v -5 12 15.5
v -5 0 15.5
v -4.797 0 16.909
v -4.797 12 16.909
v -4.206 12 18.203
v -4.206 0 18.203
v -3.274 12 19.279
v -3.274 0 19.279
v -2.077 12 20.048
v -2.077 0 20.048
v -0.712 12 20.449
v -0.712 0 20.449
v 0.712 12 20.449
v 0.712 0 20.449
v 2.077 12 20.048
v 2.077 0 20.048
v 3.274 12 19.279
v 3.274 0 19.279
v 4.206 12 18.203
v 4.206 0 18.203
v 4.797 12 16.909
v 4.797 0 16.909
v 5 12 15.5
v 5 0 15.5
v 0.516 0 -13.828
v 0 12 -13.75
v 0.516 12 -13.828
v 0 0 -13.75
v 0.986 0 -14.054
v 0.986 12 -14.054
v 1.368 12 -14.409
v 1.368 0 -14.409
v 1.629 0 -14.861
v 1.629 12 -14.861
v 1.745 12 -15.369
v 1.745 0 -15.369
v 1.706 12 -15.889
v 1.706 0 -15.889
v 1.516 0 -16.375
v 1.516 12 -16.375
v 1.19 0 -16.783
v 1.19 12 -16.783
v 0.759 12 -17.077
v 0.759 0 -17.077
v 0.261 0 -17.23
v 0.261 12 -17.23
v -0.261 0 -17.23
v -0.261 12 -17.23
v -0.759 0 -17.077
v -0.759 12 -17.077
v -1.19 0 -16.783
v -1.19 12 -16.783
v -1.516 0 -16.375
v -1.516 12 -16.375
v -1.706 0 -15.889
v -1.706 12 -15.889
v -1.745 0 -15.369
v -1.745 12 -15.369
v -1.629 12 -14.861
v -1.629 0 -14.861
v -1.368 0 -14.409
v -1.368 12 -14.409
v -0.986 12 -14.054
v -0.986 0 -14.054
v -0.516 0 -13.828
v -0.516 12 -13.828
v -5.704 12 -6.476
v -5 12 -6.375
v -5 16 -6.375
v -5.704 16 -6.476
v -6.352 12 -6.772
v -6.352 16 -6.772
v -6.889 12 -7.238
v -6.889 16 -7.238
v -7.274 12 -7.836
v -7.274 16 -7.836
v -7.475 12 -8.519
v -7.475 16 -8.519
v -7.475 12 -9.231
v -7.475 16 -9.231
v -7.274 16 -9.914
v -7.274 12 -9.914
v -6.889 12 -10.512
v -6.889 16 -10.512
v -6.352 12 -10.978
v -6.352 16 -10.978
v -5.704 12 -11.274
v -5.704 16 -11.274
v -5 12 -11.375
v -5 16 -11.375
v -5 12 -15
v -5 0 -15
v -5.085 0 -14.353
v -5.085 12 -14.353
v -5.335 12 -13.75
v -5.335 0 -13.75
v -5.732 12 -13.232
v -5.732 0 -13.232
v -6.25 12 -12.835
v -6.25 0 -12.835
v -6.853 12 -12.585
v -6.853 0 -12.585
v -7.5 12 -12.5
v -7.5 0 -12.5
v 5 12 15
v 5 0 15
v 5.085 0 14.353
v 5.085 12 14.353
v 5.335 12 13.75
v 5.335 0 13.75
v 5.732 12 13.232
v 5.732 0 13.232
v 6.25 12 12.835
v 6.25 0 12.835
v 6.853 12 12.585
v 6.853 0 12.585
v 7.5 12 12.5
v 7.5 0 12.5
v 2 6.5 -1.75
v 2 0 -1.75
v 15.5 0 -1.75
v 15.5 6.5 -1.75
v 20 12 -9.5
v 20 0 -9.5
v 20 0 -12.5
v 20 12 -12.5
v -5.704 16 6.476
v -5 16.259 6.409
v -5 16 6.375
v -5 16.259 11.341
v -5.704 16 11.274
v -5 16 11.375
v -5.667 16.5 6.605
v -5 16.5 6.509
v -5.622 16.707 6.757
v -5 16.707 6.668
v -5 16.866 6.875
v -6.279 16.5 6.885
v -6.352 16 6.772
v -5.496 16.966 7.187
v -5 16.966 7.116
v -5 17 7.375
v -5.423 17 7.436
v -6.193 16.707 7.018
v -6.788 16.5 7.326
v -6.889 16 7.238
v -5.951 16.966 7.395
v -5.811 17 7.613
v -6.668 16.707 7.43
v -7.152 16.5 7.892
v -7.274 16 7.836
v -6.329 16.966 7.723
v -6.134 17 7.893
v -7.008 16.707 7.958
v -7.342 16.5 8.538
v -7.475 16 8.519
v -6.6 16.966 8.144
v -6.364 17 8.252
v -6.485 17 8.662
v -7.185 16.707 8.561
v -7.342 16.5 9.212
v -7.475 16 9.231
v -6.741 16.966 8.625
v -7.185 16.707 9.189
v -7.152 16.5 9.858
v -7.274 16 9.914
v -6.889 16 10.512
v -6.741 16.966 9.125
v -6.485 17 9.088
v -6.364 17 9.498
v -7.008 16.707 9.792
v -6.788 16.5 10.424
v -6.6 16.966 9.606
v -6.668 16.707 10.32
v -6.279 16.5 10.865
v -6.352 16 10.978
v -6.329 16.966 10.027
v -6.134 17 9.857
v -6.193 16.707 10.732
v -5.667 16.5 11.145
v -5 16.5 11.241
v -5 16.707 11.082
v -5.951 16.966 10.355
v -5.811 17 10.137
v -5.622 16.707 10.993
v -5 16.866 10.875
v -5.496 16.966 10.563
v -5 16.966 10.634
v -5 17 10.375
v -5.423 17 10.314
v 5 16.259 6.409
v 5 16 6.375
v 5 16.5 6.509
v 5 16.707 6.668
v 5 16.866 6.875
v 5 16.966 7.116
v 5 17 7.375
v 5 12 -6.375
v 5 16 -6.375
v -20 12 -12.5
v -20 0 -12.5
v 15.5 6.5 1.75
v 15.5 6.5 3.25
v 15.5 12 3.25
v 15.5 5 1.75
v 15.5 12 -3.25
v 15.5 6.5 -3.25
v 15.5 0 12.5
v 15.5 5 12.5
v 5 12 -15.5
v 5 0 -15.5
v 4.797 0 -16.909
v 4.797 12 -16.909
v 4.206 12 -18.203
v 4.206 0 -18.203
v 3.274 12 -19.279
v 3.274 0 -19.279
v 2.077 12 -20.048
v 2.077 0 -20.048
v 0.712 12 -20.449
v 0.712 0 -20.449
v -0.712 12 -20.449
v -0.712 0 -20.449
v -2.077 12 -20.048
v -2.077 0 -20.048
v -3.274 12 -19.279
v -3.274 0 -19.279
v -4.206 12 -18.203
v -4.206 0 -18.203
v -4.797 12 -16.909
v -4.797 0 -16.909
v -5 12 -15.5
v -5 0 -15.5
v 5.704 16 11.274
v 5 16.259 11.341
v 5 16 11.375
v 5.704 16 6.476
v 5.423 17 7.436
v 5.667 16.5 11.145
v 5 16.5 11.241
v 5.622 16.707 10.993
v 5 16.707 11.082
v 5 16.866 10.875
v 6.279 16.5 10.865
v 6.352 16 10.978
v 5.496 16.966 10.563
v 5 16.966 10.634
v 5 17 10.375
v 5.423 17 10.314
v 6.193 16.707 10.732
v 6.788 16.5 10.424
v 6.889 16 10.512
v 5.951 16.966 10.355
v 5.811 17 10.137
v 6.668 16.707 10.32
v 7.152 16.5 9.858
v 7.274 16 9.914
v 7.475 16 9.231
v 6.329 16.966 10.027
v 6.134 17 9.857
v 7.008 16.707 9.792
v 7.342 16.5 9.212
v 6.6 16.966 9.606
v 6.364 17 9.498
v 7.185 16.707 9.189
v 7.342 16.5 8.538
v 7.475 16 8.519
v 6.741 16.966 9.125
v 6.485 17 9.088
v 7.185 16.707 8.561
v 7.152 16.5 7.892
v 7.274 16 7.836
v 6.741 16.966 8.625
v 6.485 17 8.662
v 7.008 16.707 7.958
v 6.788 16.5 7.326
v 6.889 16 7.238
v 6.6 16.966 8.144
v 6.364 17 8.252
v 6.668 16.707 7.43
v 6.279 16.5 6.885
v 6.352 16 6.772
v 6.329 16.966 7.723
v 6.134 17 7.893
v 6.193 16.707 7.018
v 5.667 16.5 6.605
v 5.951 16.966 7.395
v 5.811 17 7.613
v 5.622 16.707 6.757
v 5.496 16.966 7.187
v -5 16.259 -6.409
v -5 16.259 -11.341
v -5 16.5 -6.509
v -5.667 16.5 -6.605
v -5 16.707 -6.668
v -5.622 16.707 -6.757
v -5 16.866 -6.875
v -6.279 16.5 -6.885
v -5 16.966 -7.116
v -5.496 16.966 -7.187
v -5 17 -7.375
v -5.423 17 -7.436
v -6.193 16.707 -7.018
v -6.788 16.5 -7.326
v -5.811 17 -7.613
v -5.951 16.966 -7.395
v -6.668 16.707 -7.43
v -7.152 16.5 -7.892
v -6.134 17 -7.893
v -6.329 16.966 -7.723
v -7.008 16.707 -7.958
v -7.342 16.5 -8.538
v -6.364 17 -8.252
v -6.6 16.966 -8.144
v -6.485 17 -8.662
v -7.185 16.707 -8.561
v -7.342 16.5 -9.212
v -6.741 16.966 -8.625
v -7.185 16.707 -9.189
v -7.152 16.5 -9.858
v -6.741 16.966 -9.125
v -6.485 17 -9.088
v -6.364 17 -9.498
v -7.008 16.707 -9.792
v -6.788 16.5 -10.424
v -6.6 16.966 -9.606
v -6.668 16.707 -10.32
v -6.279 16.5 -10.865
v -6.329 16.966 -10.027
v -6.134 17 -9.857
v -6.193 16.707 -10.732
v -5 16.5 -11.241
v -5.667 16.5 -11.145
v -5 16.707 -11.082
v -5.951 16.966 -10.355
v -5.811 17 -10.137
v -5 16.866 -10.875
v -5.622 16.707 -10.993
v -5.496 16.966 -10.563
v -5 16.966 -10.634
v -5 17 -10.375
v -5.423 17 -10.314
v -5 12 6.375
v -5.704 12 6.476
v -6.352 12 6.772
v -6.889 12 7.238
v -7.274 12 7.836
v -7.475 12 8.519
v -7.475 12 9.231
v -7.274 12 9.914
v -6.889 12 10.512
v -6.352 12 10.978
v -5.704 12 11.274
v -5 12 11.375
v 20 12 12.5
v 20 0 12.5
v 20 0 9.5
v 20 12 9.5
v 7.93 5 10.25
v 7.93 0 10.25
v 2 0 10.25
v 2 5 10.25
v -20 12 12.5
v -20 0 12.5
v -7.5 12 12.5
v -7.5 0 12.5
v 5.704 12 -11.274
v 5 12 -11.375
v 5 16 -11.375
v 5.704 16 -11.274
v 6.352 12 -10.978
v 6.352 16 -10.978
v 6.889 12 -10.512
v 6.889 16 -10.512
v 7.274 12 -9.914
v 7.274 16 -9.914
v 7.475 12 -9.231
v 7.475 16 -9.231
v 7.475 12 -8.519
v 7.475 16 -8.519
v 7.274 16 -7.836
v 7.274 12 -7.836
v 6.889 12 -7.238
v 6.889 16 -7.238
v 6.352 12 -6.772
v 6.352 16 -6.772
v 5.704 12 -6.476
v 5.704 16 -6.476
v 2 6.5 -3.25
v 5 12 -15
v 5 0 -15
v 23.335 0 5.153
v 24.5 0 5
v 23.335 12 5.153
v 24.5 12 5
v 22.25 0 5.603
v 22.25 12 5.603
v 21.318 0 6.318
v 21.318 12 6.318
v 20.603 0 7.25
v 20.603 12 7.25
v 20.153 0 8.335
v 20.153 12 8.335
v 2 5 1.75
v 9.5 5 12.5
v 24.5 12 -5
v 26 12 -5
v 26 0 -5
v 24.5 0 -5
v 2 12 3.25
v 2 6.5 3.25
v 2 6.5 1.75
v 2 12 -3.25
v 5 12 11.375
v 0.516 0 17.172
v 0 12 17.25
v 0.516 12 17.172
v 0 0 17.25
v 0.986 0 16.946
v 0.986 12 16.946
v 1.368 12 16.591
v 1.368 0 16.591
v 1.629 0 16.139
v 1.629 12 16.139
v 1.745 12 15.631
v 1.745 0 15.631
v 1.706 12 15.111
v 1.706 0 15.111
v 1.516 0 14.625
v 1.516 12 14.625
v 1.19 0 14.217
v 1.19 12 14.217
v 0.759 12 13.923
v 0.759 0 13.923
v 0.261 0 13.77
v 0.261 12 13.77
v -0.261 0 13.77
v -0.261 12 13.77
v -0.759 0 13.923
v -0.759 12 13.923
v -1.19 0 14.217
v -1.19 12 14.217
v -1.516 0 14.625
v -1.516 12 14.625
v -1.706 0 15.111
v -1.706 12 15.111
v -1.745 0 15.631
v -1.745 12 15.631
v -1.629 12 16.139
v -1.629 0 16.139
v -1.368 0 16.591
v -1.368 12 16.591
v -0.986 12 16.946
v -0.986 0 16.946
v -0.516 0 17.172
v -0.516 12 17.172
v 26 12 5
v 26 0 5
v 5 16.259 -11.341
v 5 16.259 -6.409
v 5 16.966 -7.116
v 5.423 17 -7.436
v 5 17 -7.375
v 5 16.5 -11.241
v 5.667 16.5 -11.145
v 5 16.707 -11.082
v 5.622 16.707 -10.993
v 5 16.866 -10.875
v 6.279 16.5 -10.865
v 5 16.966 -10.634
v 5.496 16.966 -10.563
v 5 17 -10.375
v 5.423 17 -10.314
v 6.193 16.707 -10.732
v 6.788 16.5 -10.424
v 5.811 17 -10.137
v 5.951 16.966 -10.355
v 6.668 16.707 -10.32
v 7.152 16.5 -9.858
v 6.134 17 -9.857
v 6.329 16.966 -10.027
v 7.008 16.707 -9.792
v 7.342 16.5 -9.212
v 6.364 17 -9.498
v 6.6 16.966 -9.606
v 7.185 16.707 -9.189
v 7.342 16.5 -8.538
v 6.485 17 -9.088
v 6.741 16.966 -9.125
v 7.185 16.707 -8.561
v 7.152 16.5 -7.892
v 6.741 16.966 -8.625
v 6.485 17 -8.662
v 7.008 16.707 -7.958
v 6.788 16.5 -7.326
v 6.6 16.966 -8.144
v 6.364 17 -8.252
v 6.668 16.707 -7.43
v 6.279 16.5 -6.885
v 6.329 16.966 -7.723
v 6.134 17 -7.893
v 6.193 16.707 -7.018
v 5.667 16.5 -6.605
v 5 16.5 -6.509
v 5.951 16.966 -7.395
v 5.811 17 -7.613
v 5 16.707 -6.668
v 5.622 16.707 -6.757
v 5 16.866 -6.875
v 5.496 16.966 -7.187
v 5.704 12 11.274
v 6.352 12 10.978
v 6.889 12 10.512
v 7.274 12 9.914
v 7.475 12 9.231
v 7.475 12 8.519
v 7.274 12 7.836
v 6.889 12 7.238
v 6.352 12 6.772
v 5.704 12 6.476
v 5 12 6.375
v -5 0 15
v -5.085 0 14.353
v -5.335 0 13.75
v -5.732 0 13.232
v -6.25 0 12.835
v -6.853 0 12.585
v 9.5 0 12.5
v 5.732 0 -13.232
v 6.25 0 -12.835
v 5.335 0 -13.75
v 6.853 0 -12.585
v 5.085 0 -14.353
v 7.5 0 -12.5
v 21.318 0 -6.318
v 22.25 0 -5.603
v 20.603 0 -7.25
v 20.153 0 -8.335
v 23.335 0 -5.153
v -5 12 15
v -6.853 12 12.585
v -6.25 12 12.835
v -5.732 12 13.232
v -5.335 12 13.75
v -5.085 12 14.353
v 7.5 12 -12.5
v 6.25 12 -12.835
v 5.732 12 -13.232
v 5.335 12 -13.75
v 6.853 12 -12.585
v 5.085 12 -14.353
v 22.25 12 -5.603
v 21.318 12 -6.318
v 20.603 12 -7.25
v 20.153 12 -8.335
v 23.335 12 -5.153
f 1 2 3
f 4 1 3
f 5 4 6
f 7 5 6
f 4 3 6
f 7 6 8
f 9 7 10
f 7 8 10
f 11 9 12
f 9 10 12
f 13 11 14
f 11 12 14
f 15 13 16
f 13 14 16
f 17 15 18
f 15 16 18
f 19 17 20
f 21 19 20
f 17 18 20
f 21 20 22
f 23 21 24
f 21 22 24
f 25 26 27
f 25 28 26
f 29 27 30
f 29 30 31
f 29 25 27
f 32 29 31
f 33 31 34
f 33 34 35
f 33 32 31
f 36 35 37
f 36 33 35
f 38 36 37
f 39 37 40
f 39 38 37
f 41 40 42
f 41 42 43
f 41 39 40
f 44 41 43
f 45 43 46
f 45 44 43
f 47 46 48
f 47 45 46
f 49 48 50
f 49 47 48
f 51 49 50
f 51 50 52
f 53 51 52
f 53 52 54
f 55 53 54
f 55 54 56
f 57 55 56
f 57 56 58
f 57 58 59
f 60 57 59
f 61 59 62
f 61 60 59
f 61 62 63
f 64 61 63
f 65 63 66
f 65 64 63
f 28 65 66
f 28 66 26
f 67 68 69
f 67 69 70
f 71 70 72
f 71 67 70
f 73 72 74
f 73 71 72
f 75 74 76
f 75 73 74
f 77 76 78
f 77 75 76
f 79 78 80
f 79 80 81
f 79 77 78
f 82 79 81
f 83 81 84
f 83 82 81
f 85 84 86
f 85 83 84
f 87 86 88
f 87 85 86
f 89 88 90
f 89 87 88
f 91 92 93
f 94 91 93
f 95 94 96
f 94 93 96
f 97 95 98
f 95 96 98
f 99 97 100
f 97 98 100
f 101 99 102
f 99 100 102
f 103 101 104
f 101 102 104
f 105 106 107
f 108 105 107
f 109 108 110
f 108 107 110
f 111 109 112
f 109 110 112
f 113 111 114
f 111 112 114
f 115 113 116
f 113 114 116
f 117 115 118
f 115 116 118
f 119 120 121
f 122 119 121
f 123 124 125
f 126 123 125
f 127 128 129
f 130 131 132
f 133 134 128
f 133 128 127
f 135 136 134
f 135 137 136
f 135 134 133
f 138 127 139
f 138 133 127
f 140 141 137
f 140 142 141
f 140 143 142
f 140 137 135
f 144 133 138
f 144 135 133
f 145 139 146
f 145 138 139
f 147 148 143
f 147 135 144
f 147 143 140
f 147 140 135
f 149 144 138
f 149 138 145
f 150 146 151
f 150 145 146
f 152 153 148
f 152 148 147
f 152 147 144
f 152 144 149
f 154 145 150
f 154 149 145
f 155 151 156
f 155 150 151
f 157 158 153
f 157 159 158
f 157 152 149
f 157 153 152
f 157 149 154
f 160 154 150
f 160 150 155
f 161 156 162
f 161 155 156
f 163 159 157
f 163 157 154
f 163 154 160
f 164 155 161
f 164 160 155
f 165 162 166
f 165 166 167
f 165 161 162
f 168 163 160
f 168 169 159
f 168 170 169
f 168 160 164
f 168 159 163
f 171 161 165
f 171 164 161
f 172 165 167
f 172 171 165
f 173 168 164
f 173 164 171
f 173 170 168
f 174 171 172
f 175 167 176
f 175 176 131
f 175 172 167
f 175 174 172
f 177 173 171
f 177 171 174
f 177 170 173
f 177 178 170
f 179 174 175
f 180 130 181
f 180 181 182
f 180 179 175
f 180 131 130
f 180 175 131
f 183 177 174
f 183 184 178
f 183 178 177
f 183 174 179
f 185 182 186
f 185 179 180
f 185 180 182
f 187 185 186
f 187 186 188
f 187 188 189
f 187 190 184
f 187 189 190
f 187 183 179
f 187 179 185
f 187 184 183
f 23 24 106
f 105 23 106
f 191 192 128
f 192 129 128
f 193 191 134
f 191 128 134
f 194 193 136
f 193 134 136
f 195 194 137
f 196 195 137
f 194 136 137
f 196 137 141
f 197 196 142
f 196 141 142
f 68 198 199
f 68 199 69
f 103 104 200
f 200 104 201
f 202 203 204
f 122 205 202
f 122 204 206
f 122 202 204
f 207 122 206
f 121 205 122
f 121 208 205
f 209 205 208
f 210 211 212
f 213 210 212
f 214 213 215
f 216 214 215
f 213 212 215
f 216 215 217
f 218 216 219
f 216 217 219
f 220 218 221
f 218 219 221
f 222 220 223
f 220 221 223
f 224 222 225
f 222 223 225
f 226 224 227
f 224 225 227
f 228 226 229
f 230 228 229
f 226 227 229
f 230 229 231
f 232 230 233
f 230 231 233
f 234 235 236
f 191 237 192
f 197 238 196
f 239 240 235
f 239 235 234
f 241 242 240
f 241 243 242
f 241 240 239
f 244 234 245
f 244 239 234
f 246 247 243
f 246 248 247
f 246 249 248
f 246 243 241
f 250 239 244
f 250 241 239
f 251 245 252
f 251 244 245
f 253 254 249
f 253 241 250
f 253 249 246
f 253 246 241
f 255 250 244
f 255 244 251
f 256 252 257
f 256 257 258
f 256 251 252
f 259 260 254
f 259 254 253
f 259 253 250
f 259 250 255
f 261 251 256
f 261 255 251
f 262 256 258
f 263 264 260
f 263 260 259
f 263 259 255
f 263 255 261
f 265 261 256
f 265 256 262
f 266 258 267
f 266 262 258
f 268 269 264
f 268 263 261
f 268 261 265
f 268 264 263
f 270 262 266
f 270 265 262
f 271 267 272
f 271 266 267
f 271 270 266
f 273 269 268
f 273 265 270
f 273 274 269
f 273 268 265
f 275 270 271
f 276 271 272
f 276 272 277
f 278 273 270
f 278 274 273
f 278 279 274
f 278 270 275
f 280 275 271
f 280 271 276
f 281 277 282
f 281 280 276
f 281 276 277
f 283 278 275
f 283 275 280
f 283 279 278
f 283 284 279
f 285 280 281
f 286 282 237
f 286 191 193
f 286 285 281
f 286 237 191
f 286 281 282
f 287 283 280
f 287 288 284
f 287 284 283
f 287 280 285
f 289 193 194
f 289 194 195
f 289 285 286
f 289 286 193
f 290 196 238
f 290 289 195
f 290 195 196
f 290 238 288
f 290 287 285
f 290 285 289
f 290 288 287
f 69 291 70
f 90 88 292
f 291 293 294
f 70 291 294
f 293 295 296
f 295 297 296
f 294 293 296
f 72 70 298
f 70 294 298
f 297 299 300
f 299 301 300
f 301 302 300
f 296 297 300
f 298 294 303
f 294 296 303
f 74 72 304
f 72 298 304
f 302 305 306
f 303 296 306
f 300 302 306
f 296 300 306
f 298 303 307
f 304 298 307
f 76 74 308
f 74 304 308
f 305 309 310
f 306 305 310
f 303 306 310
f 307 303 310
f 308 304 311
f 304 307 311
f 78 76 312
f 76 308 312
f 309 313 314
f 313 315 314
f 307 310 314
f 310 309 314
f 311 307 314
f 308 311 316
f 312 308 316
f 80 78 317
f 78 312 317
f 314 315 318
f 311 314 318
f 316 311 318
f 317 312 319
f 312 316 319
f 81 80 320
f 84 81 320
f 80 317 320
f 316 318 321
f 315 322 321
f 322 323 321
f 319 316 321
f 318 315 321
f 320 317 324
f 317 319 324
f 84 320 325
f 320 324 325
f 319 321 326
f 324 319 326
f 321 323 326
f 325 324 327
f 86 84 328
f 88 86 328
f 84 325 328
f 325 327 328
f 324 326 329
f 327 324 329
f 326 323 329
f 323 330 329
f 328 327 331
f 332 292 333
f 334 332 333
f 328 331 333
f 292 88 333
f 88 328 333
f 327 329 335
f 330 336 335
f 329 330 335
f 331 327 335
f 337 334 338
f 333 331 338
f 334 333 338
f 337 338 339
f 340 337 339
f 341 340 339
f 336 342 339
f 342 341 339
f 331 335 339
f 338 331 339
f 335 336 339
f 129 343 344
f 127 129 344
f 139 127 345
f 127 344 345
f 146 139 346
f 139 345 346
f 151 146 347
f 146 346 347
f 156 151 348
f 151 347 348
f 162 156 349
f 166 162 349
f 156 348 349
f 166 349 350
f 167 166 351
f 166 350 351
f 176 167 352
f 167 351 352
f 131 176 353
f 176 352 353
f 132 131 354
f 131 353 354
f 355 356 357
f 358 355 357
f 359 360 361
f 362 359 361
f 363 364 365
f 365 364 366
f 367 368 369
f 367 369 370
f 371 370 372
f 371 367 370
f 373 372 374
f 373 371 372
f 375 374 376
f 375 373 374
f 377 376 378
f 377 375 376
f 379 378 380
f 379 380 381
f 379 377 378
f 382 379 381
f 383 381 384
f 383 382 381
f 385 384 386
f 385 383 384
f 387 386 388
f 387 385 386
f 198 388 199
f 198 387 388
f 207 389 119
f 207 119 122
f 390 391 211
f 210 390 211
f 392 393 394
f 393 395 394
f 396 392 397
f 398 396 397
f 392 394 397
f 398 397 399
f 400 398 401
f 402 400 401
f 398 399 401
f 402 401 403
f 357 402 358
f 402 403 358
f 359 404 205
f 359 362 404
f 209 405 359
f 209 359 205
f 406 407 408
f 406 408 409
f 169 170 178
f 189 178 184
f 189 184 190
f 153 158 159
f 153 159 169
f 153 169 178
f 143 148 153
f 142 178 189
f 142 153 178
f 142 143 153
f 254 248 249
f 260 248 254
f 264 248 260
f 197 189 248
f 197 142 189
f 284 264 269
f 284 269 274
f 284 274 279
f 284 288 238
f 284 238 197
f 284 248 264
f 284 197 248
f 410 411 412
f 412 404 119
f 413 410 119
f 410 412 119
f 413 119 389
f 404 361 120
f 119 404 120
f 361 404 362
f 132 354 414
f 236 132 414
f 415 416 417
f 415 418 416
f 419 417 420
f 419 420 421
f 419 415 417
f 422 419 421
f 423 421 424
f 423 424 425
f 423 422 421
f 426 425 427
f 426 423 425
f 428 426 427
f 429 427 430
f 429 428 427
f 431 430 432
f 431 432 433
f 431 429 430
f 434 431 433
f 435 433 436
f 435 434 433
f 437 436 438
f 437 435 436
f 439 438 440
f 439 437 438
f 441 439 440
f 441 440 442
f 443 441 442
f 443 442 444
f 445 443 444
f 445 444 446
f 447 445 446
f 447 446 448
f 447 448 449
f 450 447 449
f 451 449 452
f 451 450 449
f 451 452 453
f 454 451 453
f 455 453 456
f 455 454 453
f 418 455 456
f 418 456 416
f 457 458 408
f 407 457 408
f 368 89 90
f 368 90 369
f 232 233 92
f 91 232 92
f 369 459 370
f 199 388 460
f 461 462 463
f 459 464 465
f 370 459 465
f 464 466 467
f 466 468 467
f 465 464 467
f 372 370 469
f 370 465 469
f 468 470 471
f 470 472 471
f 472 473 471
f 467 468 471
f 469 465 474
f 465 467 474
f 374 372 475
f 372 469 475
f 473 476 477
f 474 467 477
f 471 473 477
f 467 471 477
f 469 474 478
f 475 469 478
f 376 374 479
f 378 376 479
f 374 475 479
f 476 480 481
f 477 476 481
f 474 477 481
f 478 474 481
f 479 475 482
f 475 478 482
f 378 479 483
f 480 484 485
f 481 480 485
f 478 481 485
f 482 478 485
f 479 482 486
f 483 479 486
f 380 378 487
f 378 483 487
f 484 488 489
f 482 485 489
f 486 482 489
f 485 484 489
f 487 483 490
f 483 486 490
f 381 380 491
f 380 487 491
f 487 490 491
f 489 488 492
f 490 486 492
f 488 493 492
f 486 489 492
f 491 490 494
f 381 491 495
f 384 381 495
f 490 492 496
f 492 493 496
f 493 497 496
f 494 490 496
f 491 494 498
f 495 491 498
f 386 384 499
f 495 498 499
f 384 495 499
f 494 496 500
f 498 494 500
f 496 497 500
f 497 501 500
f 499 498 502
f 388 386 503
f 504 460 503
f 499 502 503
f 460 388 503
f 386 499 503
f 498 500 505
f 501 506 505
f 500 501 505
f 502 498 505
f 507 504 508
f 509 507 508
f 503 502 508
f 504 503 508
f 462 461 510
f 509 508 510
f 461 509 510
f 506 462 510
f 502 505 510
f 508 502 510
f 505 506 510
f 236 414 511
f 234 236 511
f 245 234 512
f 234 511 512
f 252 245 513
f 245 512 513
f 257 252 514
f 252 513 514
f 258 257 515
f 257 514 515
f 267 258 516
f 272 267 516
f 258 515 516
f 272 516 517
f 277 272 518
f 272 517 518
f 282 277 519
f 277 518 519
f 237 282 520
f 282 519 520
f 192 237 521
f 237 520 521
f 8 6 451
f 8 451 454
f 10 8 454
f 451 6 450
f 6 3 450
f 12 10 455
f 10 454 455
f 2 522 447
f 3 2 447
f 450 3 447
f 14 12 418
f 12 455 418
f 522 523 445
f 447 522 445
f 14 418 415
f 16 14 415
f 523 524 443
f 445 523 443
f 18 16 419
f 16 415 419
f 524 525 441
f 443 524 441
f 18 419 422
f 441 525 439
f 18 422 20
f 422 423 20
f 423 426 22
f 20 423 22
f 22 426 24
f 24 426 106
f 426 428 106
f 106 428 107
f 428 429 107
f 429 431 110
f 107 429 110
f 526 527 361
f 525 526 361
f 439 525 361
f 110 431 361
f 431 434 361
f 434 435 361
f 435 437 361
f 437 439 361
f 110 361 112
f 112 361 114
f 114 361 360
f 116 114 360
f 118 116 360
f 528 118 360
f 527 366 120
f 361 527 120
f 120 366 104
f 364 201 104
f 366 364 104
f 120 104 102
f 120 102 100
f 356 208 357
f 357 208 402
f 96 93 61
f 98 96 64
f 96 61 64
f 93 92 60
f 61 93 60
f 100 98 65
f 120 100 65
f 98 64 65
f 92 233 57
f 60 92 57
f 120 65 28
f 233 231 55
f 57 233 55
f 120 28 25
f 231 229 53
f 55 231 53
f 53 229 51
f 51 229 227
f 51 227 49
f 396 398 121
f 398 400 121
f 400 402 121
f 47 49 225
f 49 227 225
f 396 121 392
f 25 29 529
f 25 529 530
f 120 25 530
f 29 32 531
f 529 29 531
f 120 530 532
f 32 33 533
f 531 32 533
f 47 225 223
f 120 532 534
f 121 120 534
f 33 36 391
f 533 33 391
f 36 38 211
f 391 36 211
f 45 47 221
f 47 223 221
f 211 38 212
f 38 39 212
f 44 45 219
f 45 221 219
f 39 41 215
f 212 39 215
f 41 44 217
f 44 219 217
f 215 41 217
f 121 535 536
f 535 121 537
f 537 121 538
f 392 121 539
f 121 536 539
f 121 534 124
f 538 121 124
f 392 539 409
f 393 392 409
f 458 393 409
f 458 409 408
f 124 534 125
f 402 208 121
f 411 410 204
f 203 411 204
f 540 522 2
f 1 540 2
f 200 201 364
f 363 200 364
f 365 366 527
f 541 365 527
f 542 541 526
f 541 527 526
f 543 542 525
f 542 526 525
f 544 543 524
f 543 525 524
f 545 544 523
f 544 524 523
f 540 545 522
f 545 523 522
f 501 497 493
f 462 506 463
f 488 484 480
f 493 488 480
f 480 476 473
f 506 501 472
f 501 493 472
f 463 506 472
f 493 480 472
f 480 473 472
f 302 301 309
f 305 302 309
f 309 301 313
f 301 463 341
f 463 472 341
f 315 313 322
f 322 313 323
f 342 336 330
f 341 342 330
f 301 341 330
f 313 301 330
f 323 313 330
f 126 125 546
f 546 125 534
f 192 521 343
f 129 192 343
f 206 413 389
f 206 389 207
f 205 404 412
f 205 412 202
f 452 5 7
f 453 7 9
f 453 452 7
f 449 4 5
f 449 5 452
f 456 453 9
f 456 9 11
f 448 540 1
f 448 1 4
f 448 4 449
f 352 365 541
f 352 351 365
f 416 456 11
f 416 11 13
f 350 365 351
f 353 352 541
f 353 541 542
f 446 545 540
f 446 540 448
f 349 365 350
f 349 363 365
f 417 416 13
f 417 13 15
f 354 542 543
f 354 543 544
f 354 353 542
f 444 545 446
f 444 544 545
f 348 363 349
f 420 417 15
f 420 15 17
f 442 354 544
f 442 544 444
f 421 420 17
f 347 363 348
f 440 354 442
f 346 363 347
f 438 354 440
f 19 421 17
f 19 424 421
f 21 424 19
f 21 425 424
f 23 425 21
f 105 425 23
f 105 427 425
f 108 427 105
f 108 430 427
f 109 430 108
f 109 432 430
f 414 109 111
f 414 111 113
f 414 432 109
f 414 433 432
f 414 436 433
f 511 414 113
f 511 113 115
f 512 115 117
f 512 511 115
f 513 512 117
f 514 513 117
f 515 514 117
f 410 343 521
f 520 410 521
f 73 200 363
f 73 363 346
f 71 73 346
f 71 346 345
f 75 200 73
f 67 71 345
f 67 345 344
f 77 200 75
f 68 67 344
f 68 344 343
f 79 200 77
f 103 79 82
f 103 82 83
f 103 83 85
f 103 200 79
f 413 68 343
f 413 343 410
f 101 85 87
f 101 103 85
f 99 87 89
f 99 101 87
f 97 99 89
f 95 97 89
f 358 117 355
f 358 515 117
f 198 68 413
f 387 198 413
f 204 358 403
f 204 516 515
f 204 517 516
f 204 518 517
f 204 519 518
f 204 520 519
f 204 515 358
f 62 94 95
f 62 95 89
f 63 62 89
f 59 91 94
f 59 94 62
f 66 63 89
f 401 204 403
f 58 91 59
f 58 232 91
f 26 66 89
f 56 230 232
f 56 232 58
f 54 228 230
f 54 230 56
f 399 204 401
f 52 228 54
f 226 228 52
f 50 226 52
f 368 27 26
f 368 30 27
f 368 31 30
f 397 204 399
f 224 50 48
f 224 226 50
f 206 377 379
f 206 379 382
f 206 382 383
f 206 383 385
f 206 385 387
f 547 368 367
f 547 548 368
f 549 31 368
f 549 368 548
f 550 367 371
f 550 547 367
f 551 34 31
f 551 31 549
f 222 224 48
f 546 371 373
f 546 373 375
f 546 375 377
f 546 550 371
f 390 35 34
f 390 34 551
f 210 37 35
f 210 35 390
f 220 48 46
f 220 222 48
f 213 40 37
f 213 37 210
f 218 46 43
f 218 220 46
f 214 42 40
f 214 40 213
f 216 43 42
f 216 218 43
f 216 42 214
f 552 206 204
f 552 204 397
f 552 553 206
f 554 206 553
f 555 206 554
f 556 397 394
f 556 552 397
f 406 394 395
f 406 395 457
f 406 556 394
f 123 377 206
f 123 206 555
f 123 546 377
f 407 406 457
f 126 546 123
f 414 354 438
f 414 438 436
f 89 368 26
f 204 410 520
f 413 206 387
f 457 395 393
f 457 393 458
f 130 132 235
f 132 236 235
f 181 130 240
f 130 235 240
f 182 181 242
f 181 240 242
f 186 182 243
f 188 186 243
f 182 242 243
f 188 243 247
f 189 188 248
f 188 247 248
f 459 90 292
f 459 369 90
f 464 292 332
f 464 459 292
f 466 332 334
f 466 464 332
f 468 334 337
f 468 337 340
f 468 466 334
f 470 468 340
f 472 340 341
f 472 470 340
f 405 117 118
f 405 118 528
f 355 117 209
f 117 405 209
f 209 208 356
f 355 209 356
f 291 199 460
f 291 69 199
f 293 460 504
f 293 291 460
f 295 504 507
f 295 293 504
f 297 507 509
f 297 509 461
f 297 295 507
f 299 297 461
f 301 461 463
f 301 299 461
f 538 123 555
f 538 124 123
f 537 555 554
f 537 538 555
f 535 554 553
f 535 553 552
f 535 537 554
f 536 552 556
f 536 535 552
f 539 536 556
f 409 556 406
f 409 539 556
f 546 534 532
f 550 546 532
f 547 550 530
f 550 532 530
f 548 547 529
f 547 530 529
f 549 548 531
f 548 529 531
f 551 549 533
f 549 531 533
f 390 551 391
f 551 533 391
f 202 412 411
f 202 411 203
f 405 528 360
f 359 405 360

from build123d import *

# Parameters (mm, degrees)
SKETCH2_R           = 1.75
SKETCH2_W           = 13.5
SKETCH2_H           = 3.5
BOSS_EXTRUDE2_DEPTH = 12
BOSS_EXTRUDE3_START = 7
SKETCH2_4_R         = 1.75
SKETCH2_4_W         = 13.5
SKETCH2_4_H         = 6.5
SKETCH2_4_H_2       = 3.5
BOSS_EXTRUDE3_DEPTH = 5
CUT_EXTRUDE1_START  = 12
SKETCH2_6_W         = 13.5
SKETCH2_6_H         = 1.5
CUT_EXTRUDE1_DEPTH  = 5.5
FILLET1_R           = 4.5
CUT_EXTRUDE4_DEPTH  = 5
BOSS_EXTRUDE4_DEPTH = 5
FILLET2_R           = 1


with BuildPart() as part:
    # Sketch2 → Boss-Extrude2 (new body)
    with BuildSketch(Plane(origin=(0, 0, 0), x_dir=(1, 0, 0), z_dir=(0, 1, 0))):
        with BuildLine():
            Line((-20, 12.5), (-20, -12.5))
            Line((-20, -12.5), (-7.5, -12.5))
            ThreePointArc((-7.5, -12.5), (-5.732233047, -13.232233047), (-5, -15))
            Line((-5, -15), (-5, -15.5))
            ThreePointArc((-5, -15.5), (0, -20.5), (5, -15.5))
            Line((5, -15.5), (5, -15))
            ThreePointArc((5, -15), (5.732233047, -13.232233047), (7.5, -12.5))
            Line((7.5, -12.5), (20, -12.5))
            Line((20, -12.5), (20, -5))
            Line((20, -5), (26, -5))
            Line((26, -5), (26, 5))
            Line((26, 5), (20, 5))
            Line((20, 5), (20, 12.5))
            Line((20, 12.5), (7.5, 12.5))
            ThreePointArc((7.5, 12.5), (5.732233047, 13.232233047), (5, 15))
            Line((5, 15), (5, 15.5))
            ThreePointArc((5, 15.5), (0, 20.5), (-5, 15.5))
            Line((-5, 15.5), (-5, 15))
            ThreePointArc((-5, 15), (-5.732233047, 13.232233047), (-7.5, 12.5))
            Line((-7.5, 12.5), (-20, 12.5))
        make_face()
        with Locations(Location((0, -15.5, 0), (0, 0, 270))):
            Circle(SKETCH2_R, mode=Mode.SUBTRACT)
        with Locations(Location((0, 15.5, 0), (0, 0, 270))):
            Circle(SKETCH2_R, mode=Mode.SUBTRACT)
        with Locations((8.75, 0)):
            Rectangle(SKETCH2_W, SKETCH2_H, mode=Mode.SUBTRACT)
    extrude(amount=BOSS_EXTRUDE2_DEPTH)

    # Sketch2<4> → Boss-Extrude3 (add)
    with BuildSketch(Plane(origin=(0, 0, 0), x_dir=(1, 0, 0), z_dir=(0, 1, 0)).offset(BOSS_EXTRUDE3_START)):
        with BuildLine():
            Line((-20, -12.5), (-7.5, -12.5))
            ThreePointArc((-7.5, -12.5), (-5.732233047, -13.232233047), (-5, -15))
            Line((-5, -15), (-5, -15.5))
            ThreePointArc((-5, -15.5), (0, -20.5), (5, -15.5))
            Line((5, -15.5), (5, -15))
            ThreePointArc((5, -15), (5.732233047, -13.232233047), (7.5, -12.5))
            Line((7.5, -12.5), (20, -12.5))
            Line((20, -12.5), (20, -5))
            Line((20, -5), (26, -5))
            Line((26, -5), (26, 5))
            Line((26, 5), (20, 5))
            Line((20, 5), (20, 12.5))
            Line((20, 12.5), (7.5, 12.5))
            ThreePointArc((7.5, 12.5), (5.732233047, 13.232233047), (5, 15))
            Line((5, 15), (5, 15.5))
            ThreePointArc((5, 15.5), (0, 20.5), (-5, 15.5))
            Line((-5, 15.5), (-5, 15))
            ThreePointArc((-5, 15), (-5.732233047, 13.232233047), (-7.5, 12.5))
            Line((-7.5, 12.5), (-20, 12.5))
            Line((-20, 12.5), (-20, -12.5))
        make_face()
        with Locations(Location((0, -15.5, 0), (0, 0, 270))):
            Circle(SKETCH2_4_R, mode=Mode.SUBTRACT)
        with Locations(Location((0, 15.5, 0), (0, 0, 270))):
            Circle(SKETCH2_4_R, mode=Mode.SUBTRACT)
        with Locations((8.75, 0)):
            Rectangle(SKETCH2_4_W, SKETCH2_4_H, mode=Mode.SUBTRACT)
        with Locations((8.75, 0)):
            Rectangle(SKETCH2_4_W, SKETCH2_4_H_2, mode=Mode.SUBTRACT)
    extrude(amount=BOSS_EXTRUDE3_DEPTH)

    # Sketch2<6> → Cut-Extrude1 (cut)
    with BuildSketch(Plane(origin=(0, 0, 0), x_dir=(1, 0, 0), z_dir=(0, 1, 0)).offset(CUT_EXTRUDE1_START)):
        with Locations((8.75, -2.5)):
            Rectangle(SKETCH2_6_W, SKETCH2_6_H)
        with Locations((8.75, 2.5)):
            Rectangle(SKETCH2_6_W, SKETCH2_6_H)
    extrude(amount=-CUT_EXTRUDE1_DEPTH, mode=Mode.SUBTRACT)

    # Fillet1
    fillet1_edges = [part.edges().sort_by_distance(p)[0] for p in [
        (20, 6, -5),
        (20, 6, 5),
    ]]
    fillet(fillet1_edges, radius=FILLET1_R)

    # Sketch3 → Cut-Extrude4 (cut)
    with BuildSketch(Plane.XZ):
        Polygon((7.930232558, 10.25), (2, 1.75), (15.5, 1.75), (15.5, 12.5), (9.5, 12.5), align=None)
        Polygon((2, 10.25), (2, 1.75), (7.930232558, 10.25), align=None)
    extrude(amount=-CUT_EXTRUDE4_DEPTH, mode=Mode.SUBTRACT)

    # Sketch4 → Boss-Extrude4 (add)
    with BuildSketch(Plane(origin=(0, 12, 0), x_dir=(1, 0, 0), z_dir=(0, 1, 0))):
        with BuildLine():
            Line((-5, 11.375), (5, 11.375))
            ThreePointArc((5, 11.375), (7.5, 8.875), (5, 6.375))
            Line((5, 6.375), (-5, 6.375))
            ThreePointArc((-5, 6.375), (-7.5, 8.875), (-5, 11.375))
        make_face()
        with BuildLine():
            Line((-5, -11.375), (5, -11.375))
            ThreePointArc((5, -11.375), (7.5, -8.875), (5, -6.375))
            Line((5, -6.375), (-5, -6.375))
            ThreePointArc((-5, -6.375), (-7.5, -8.875), (-5, -11.375))
        make_face()
    extrude(amount=BOSS_EXTRUDE4_DEPTH)

    # Fillet2
    fillet2_edges = [part.edges().sort_by_distance(p)[0] for p in [
        (-7.5, 17, -8.875),
        (0, 17, -6.375),
        (7.5, 17, -8.875),
        (0, 17, -11.375),
        (-7.5, 17, 8.875),
        (0, 17, 11.375),
        (7.5, 17, 8.875),
        (0, 17, 6.375),
    ]]
    fillet(fillet2_edges, radius=FILLET2_R)


solid = part.part
